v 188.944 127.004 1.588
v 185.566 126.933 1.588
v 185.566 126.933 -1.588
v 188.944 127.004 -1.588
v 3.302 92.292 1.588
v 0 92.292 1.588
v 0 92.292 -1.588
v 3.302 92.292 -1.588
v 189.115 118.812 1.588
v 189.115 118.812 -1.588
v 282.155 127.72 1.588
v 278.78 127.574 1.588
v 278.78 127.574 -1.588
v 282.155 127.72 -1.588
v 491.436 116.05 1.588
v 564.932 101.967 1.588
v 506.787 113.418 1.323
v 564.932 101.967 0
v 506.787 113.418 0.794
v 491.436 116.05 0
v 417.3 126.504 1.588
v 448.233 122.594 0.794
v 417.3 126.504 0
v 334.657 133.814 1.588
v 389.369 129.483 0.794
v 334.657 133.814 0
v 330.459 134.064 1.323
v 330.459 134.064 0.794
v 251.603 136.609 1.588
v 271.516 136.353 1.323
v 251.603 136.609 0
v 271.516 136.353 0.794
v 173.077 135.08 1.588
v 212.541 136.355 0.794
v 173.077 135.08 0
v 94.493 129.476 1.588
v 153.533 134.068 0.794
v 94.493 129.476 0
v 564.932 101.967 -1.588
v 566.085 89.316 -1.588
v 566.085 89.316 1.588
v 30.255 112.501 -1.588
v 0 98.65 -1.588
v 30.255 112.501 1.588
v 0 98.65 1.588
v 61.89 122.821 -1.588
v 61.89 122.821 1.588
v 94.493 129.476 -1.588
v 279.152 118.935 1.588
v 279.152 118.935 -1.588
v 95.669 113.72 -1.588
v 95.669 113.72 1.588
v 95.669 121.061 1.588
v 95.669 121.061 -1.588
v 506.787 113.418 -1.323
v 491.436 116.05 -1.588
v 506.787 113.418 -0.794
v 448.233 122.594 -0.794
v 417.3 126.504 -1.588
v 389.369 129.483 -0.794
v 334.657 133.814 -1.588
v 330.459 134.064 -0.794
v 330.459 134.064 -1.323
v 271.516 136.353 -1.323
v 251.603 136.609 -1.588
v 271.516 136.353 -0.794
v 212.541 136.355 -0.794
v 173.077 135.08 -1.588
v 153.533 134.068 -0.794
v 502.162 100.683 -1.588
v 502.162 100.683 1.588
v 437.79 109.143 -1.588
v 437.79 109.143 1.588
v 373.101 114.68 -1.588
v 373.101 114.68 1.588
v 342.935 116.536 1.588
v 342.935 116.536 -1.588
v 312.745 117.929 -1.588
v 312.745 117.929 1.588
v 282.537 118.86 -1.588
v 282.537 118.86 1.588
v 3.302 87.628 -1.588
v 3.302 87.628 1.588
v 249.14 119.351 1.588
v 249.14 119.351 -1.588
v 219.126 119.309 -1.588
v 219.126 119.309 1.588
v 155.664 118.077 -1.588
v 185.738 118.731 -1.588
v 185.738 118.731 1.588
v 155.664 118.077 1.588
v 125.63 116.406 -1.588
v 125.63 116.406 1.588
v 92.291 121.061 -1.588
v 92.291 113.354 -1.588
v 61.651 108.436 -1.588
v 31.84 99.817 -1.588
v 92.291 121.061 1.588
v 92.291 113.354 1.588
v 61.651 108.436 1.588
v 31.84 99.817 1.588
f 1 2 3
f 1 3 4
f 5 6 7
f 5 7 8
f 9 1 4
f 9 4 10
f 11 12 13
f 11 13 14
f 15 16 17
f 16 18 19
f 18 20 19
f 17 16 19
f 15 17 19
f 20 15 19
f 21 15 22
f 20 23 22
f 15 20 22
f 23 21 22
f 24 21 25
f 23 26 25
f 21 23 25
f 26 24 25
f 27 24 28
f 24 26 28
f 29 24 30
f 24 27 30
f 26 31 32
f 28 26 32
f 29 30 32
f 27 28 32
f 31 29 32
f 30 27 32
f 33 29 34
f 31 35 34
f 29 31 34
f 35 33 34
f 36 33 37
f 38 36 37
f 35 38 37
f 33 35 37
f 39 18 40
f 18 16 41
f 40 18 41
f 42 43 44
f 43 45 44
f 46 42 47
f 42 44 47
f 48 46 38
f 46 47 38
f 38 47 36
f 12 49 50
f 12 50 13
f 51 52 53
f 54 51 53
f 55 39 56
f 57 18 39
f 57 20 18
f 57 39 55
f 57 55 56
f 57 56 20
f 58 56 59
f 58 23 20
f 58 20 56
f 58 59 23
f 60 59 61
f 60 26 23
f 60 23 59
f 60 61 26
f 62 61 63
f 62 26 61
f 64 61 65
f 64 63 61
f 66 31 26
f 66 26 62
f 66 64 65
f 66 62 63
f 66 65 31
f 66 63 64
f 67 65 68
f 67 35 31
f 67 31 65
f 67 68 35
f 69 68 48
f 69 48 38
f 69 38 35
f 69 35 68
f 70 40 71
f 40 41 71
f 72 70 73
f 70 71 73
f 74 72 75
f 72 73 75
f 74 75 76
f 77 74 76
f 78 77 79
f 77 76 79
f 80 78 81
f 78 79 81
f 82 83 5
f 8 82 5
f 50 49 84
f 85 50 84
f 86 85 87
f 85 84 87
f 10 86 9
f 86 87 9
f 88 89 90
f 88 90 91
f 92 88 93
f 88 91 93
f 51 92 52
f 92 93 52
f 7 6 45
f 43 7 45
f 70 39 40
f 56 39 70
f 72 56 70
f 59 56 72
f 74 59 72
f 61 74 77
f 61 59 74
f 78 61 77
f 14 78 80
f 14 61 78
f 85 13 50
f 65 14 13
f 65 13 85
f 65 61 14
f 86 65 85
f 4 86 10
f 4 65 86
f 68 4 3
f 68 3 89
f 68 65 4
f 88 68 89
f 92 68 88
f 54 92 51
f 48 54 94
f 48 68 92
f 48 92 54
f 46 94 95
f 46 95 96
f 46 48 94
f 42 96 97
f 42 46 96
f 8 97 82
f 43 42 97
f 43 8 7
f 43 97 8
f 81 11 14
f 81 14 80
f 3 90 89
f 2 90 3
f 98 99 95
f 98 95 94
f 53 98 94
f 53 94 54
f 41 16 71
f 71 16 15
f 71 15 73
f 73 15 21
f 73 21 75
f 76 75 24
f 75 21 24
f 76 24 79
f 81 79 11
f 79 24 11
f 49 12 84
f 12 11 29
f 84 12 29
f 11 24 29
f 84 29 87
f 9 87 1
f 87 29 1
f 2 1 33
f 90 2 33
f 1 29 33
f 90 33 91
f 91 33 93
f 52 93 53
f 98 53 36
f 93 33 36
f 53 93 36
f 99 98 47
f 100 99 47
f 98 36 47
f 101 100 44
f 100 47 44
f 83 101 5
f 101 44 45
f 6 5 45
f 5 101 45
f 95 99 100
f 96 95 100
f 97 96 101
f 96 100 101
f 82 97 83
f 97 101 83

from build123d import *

# Parameters (mm, degrees)
BOSS_EXTRUDE1_DEPTH = 1.5875
SKETCH2_W           = 3.302
SKETCH2_H           = 6.35
SKETCH2_W_2         = 3.3782
SKETCH2_H_2         = 12.7
CUT_EXTRUDE1_DEPTH  = 583.351295045


with BuildPart() as part:
    # Sketch1 → Boss-Extrude1 (new, symmetric)
    with BuildSketch(Plane.XY):
        with BuildLine():
            Line((0, 98.649963947), (0, 85.942195343))
            ThreePointArc((0, 85.942195343), (44.883725347, 104.075489893), (92.3925, 113.364273632))
            ThreePointArc((92.3925, 113.364273632), (139.073495573, 117.280009783), (185.895946704, 118.731356536))
            ThreePointArc((185.895946704, 118.731356536), (279.546572247, 118.926979108), (373.101055052, 114.680017829))
            ThreePointArc((373.101055052, 114.680017829), (470.024153779, 105.277481614), (566.085246422, 89.316239979))
            Line((566.085246422, 89.316239979), (564.932089986, 101.967188211))
            add(Edge.make_bspline(
                [(564.932089986, 101.967188211), (526.305455218, 110.358765648), (487.405693808, 117.234573225), (438.439550099, 123.934433666), (428.624759847, 125.179975832), (408.998984047, 127.476532586), (399.18472115, 128.528085596), (369.737829992, 131.394153114), (350.101100844, 132.920187183), (291.174630327, 136.352842591), (251.868630305, 137.115735014), (173.213311456, 135.594221207), (133.863993721, 133.309891798), (94.492645692, 129.475822378)],
                knots=[0, 0, 0, 0, 0.25, 0.25, 0.3125, 0.3125, 0.375, 0.375, 0.5, 0.5, 0.75, 0.75, 1, 1, 1, 1], degree=3))
            ThreePointArc((94.492645692, 129.475822378), (45.925545315, 118.111564298), (0, 98.649963947))
        make_face()
    extrude(amount=BOSS_EXTRUDE1_DEPTH, both=True)

    # Sketch2 → Cut-Extrude1 (cut, through all)
    with BuildSketch(Plane.XY.offset(1.5875)):
        with Locations((1.651, 89.117195343)):
            Rectangle(SKETCH2_W, SKETCH2_H)
        with Locations((93.98, 114.711123803)):
            Rectangle(SKETCH2_W_2, SKETCH2_H_2)
        Polygon((185.566099292, 126.933217537), (188.943559255, 127.003924269), (189.209374036, 114.306706365), (185.831914074, 114.235999633), align=None)
        Polygon((278.780272456, 127.574359039), (282.155347854, 127.719621905), (282.701448855, 115.031368531), (279.326373458, 114.886105664), align=None)
    extrude(amount=-CUT_EXTRUDE1_DEPTH, mode=Mode.SUBTRACT)


solid = part.part
